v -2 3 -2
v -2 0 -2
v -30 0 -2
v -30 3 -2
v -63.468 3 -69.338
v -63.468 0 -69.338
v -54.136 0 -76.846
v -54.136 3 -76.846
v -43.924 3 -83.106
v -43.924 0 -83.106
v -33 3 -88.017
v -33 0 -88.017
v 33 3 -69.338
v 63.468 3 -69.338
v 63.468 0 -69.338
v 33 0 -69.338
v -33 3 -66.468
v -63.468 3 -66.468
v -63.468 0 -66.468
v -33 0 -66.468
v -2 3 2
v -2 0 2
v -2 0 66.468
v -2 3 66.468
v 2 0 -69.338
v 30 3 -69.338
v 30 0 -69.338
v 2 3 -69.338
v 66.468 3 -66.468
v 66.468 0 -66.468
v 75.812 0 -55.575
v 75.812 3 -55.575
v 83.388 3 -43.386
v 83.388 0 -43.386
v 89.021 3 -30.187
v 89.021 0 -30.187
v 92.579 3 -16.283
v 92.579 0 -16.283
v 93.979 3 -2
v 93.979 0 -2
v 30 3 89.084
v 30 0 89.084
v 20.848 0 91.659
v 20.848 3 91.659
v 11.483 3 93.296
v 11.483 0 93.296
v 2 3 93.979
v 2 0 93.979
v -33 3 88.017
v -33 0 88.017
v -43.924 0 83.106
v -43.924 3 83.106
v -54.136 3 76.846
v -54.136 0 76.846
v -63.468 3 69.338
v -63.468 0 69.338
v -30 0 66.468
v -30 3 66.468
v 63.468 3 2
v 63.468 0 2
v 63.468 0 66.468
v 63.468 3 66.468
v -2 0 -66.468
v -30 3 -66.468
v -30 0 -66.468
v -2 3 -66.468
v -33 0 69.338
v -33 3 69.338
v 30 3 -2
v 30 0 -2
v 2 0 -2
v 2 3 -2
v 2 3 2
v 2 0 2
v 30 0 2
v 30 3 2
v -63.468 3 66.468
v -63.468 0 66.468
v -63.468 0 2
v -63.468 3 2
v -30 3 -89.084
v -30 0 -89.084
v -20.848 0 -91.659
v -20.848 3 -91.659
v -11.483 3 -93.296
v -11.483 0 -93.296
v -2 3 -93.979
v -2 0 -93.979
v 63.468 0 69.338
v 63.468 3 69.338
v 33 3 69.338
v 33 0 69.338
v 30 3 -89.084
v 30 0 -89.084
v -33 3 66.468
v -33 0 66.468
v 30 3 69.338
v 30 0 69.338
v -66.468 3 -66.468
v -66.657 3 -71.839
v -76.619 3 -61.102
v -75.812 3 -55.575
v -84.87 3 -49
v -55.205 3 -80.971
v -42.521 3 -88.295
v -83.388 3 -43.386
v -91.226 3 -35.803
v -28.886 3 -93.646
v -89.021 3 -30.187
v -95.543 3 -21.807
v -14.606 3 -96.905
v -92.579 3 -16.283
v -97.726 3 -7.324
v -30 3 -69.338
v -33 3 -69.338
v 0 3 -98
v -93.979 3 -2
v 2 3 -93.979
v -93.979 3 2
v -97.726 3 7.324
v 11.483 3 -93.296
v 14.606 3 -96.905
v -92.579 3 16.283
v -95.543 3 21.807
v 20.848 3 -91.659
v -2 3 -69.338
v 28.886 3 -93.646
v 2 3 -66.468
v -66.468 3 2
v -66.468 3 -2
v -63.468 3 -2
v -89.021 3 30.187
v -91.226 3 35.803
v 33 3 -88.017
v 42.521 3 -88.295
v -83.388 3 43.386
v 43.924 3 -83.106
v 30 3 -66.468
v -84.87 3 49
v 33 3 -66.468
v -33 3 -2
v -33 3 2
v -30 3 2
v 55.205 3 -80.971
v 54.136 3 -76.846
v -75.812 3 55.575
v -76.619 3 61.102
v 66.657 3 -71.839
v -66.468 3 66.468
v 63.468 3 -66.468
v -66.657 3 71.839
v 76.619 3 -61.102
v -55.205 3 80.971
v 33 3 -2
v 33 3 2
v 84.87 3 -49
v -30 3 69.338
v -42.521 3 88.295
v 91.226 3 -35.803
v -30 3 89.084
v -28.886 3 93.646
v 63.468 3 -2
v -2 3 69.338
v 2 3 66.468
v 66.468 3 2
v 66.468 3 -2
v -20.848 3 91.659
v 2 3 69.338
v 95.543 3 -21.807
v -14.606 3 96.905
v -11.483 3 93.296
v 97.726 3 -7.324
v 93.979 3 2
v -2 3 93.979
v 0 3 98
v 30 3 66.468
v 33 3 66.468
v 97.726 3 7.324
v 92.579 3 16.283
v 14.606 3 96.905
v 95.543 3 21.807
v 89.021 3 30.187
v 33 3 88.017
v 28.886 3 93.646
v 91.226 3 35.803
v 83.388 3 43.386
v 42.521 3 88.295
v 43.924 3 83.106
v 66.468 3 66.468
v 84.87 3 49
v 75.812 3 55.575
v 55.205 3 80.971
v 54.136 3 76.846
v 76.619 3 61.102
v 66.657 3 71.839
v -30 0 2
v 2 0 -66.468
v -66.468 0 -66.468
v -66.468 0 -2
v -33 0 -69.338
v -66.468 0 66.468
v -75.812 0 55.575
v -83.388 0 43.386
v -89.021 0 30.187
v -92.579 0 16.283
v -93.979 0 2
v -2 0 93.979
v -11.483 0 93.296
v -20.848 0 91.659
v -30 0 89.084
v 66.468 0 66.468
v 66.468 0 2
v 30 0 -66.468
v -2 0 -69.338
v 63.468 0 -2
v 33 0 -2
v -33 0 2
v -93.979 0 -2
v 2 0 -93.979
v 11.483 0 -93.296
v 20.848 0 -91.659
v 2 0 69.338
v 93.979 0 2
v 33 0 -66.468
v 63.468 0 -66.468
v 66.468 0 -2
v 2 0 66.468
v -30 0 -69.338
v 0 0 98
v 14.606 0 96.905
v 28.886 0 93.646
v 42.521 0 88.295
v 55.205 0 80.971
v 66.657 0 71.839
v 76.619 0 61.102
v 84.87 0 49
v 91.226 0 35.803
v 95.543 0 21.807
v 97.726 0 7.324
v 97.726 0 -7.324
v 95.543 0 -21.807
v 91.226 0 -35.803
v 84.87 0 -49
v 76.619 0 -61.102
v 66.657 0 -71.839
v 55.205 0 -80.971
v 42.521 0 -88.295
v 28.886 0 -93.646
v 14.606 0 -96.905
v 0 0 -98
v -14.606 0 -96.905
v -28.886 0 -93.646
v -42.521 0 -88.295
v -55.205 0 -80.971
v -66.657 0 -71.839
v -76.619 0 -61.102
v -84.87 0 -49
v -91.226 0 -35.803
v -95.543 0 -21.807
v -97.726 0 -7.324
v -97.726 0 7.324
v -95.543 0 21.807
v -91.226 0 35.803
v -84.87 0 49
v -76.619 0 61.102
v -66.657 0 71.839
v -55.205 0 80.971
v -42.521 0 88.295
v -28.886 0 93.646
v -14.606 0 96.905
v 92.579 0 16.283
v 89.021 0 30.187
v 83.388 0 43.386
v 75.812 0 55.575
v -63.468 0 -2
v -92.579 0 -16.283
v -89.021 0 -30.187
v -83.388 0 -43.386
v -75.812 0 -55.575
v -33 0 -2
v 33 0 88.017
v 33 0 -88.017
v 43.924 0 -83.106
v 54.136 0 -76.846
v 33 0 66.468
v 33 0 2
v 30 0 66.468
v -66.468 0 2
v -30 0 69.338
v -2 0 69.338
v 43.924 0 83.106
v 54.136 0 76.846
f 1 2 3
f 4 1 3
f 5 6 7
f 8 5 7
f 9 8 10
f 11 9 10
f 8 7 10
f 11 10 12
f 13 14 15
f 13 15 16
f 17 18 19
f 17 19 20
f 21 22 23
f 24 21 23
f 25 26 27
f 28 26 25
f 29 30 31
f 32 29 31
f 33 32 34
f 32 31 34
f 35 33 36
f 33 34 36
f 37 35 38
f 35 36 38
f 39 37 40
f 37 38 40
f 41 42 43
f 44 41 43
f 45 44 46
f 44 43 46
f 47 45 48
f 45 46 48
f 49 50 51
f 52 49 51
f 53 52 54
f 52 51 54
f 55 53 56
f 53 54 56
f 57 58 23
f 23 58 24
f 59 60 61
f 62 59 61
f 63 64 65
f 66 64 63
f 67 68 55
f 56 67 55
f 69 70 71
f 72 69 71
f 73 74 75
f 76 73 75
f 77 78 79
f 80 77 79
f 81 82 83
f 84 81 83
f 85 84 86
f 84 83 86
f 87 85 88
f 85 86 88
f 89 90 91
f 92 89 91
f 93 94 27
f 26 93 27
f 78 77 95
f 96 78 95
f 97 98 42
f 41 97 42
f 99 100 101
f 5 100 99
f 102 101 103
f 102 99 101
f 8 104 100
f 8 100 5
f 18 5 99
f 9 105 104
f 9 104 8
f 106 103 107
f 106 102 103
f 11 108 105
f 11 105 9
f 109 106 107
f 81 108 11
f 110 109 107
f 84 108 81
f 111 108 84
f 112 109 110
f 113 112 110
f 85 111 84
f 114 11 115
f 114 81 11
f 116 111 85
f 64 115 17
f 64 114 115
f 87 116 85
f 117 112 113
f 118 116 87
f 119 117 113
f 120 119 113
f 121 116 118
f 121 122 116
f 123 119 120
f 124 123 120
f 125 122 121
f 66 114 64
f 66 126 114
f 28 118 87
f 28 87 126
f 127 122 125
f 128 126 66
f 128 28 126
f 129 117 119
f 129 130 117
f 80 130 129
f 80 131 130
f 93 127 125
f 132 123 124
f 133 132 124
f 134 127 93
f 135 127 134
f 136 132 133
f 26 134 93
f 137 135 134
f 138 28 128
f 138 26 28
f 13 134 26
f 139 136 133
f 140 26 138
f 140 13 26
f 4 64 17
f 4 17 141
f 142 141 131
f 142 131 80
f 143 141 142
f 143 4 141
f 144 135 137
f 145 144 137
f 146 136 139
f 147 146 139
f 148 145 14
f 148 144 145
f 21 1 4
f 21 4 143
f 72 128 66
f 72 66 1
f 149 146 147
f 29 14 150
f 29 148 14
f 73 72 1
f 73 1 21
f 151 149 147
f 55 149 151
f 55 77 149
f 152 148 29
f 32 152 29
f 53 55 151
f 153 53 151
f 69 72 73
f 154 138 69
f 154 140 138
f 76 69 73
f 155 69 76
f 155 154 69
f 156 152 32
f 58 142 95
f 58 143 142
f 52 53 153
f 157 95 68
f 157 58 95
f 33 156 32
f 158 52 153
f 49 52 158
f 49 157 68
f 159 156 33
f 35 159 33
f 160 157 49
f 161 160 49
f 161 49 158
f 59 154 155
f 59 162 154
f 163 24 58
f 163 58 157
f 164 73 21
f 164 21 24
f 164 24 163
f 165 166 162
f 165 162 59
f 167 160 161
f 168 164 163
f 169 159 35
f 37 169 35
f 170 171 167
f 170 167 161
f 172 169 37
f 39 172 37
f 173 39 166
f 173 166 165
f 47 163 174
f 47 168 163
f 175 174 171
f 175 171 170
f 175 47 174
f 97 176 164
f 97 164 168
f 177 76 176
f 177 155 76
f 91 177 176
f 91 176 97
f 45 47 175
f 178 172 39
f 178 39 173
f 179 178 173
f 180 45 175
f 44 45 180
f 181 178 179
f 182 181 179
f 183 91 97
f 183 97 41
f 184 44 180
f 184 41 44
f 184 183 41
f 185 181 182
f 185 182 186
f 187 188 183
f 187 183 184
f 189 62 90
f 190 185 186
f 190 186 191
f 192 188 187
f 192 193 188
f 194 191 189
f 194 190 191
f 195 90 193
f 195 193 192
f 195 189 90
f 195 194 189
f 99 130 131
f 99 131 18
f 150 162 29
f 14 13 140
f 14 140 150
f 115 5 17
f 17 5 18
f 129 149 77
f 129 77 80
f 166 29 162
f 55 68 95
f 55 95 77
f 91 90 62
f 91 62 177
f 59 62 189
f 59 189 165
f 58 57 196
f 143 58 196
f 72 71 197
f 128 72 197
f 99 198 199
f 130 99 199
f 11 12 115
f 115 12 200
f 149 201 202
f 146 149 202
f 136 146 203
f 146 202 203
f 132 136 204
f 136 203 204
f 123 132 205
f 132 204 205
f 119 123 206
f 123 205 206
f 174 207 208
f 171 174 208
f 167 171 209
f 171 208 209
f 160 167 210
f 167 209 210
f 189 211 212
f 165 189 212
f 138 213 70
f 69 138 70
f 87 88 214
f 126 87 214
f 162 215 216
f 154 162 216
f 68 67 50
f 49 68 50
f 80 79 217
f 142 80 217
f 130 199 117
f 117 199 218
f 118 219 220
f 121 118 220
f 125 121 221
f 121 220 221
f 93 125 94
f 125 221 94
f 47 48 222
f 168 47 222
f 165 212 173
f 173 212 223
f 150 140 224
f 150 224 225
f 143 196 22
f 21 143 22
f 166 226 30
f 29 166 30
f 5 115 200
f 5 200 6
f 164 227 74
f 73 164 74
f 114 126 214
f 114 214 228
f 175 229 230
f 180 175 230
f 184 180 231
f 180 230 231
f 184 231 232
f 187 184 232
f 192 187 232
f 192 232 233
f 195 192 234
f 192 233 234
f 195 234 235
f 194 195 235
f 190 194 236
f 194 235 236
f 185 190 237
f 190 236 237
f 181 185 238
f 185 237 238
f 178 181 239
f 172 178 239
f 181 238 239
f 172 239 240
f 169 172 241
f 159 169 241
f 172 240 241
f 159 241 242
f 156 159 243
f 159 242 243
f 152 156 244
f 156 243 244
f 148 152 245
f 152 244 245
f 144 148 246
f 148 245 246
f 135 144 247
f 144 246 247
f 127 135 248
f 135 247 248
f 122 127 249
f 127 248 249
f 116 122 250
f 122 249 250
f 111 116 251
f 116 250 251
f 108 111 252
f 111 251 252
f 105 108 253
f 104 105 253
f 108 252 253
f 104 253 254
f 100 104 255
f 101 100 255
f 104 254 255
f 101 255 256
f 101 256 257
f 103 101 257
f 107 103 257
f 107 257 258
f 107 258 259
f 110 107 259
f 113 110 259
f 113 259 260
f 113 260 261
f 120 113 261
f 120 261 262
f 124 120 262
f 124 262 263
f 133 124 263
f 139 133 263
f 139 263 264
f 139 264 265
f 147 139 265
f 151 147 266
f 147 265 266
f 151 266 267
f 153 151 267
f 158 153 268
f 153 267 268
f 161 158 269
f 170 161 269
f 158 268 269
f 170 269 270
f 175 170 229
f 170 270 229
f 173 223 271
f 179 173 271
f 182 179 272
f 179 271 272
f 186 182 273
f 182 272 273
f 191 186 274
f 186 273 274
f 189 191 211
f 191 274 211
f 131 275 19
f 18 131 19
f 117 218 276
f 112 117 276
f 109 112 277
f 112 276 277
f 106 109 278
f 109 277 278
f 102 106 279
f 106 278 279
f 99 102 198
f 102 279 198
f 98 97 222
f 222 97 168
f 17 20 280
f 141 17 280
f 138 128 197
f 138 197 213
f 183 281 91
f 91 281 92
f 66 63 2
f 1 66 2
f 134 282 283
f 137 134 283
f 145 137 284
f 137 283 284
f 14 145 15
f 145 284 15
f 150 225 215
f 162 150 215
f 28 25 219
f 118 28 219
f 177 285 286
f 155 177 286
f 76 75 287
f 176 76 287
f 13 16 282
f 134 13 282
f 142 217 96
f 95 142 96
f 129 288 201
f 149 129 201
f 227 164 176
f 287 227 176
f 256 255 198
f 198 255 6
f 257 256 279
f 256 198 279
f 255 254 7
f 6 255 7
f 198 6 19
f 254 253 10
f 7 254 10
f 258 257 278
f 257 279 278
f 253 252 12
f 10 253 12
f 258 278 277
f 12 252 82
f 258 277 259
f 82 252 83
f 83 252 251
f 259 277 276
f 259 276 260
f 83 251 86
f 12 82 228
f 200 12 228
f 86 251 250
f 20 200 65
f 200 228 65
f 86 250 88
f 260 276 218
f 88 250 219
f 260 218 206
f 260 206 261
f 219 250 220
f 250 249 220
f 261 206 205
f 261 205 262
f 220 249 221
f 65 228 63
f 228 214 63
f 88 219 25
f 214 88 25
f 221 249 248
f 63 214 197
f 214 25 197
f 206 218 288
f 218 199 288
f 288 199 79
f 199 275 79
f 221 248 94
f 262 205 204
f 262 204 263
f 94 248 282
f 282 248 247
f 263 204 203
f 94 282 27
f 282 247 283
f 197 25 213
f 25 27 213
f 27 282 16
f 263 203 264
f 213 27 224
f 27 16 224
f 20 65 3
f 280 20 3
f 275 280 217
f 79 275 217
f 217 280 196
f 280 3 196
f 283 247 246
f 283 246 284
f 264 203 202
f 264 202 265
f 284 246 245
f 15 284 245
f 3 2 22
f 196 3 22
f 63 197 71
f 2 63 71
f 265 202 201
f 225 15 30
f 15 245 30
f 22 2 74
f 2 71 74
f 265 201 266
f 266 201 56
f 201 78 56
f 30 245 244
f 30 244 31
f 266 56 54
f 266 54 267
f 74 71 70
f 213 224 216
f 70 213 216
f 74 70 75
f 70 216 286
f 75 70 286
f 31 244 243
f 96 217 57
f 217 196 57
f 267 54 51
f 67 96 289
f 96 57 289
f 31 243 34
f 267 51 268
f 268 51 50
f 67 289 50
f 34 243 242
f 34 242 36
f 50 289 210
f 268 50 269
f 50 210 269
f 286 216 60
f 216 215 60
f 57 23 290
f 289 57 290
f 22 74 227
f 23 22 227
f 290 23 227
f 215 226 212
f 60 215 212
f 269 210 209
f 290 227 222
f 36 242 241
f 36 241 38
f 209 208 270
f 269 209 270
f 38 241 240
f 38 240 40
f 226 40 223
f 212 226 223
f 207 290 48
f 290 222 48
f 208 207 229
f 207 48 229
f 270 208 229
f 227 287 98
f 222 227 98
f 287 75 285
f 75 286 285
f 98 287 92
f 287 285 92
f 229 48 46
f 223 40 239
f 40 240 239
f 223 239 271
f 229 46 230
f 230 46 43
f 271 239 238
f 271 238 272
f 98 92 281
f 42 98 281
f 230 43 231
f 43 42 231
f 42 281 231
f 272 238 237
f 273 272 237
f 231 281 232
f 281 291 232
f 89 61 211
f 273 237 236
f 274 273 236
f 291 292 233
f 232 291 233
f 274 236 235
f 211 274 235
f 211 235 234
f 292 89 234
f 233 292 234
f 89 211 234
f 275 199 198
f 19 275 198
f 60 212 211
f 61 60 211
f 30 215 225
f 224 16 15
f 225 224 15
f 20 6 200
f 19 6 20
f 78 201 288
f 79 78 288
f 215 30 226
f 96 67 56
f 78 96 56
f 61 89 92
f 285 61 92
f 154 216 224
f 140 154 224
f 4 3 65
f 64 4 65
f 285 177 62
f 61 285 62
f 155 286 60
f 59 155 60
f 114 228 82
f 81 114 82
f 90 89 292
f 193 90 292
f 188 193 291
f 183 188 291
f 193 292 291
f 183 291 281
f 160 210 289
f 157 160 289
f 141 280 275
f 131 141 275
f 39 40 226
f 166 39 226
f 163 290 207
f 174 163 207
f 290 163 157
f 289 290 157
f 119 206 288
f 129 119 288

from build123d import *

# Parameters (mm, degrees)
SKETCH_1_R      = 98
EXTRUDE_1_DEPTH = 3
EXTRUDE_2_DEPTH = 3


with BuildPart() as part:
    # 草图1 → 凸台-拉伸1 (new body)
    with BuildSketch(Plane(origin=(0, 0, 0), x_dir=(1, 0, 0), z_dir=(0, 1, 0))):
        with Locations(Location((0, 0, 0), (0, 0, 270))):
            Circle(SKETCH_1_R)
        with BuildLine():
            ThreePointArc((-66.468037432, -66.468037432), (-86.457056016, -36.894138626), (-93.978720996, -2))
            Line((-93.978720996, -2), (-66.468037432, -2))
            Line((-66.468037432, -2), (-66.468037432, -66.468037432))
        make_face(mode=Mode.SUBTRACT)
        with BuildLine():
            Line((-63.468037432, -2), (-33, -2))
            Line((-33, -2), (-33, -88.017043804))
            ThreePointArc((-33, -88.017043804), (-49.129867339, -80.138980123), (-63.468037432, -69.338360412))
            Line((-63.468037432, -69.338360412), (-63.468037432, -2))
        make_face(mode=Mode.SUBTRACT)
        with BuildLine():
            Line((-30, -2), (-2, -2))
            Line((-2, -2), (-2, -93.978720996))
            ThreePointArc((-2, -93.978720996), (-16.186074601, -92.595955576), (-30, -89.084229805))
            Line((-30, -89.084229805), (-30, -2))
        make_face(mode=Mode.SUBTRACT)
        with BuildLine():
            Line((2, -93.978720996), (2, -2))
            Line((2, -2), (30, -2))
            Line((30, -2), (30, -89.084229805))
            ThreePointArc((30, -89.084229805), (16.186074601, -92.595955576), (2, -93.978720996))
        make_face(mode=Mode.SUBTRACT)
        with BuildLine():
            Line((33, -2), (63.468037432, -2))
            Line((63.468037432, -2), (63.468037432, -69.338360412))
            ThreePointArc((63.468037432, -69.338360412), (49.129867339, -80.138980123), (33, -88.017043804))
            Line((33, -88.017043804), (33, -2))
        make_face(mode=Mode.SUBTRACT)
        with BuildLine():
            ThreePointArc((93.978720996, -2), (86.457056016, -36.894138626), (66.468037432, -66.468037432))
            Line((66.468037432, -66.468037432), (66.468037432, -2))
            Line((66.468037432, -2), (93.978720996, -2))
        make_face(mode=Mode.SUBTRACT)
        with BuildLine():
            Line((-66.468037432, 2), (-93.978720996, 2))
            ThreePointArc((-93.978720996, 2), (-86.457056016, 36.894138626), (-66.468037432, 66.468037432))
            Line((-66.468037432, 66.468037432), (-66.468037432, 2))
        make_face(mode=Mode.SUBTRACT)
        with BuildLine():
            Line((-33, 2), (-63.468037432, 2))
            Line((-63.468037432, 2), (-63.468037432, 69.338360412))
            ThreePointArc((-63.468037432, 69.338360412), (-49.129867339, 80.138980123), (-33, 88.017043804))
            Line((-33, 88.017043804), (-33, 2))
        make_face(mode=Mode.SUBTRACT)
        with BuildLine():
            Line((-2, 2), (-30, 2))
            Line((-30, 2), (-30, 89.084229805))
            ThreePointArc((-30, 89.084229805), (-16.186074601, 92.595955576), (-2, 93.978720996))
            Line((-2, 93.978720996), (-2, 2))
        make_face(mode=Mode.SUBTRACT)
        with BuildLine():
            Line((30, 2), (2, 2))
            Line((2, 2), (2, 93.978720996))
            ThreePointArc((2, 93.978720996), (16.186074601, 92.595955576), (30, 89.084229805))
            Line((30, 89.084229805), (30, 2))
        make_face(mode=Mode.SUBTRACT)
        with BuildLine():
            Line((63.468037432, 2), (33, 2))
            Line((33, 2), (33, 88.017043804))
            ThreePointArc((33, 88.017043804), (49.129867339, 80.138980123), (63.468037432, 69.338360412))
            Line((63.468037432, 69.338360412), (63.468037432, 2))
        make_face(mode=Mode.SUBTRACT)
        with BuildLine():
            Line((93.978720996, 2), (66.468037432, 2))
            Line((66.468037432, 2), (66.468037432, 66.468037432))
            ThreePointArc((66.468037432, 66.468037432), (86.457056016, 36.894138626), (93.978720996, 2))
        make_face(mode=Mode.SUBTRACT)
    extrude(amount=EXTRUDE_1_DEPTH)

    # 草图2 → 凸台-拉伸2 (add)
    with BuildSketch(Plane(origin=(0, 3, 0), x_dir=(1, 0, 0), z_dir=(0, 1, 0))):
        Polygon((-66.468037432, 66.468037432), (66.468037432, 66.468037432), (63.468037432, 69.338360412), (-63.468037432, 69.338360412), align=None)
        Polygon((-66.468037432, -66.468037432), (66.468037432, -66.468037432), (63.468037432, -69.338360412), (-63.468037432, -69.338360412), align=None)
    extrude(amount=-EXTRUDE_2_DEPTH)


solid = part.part
